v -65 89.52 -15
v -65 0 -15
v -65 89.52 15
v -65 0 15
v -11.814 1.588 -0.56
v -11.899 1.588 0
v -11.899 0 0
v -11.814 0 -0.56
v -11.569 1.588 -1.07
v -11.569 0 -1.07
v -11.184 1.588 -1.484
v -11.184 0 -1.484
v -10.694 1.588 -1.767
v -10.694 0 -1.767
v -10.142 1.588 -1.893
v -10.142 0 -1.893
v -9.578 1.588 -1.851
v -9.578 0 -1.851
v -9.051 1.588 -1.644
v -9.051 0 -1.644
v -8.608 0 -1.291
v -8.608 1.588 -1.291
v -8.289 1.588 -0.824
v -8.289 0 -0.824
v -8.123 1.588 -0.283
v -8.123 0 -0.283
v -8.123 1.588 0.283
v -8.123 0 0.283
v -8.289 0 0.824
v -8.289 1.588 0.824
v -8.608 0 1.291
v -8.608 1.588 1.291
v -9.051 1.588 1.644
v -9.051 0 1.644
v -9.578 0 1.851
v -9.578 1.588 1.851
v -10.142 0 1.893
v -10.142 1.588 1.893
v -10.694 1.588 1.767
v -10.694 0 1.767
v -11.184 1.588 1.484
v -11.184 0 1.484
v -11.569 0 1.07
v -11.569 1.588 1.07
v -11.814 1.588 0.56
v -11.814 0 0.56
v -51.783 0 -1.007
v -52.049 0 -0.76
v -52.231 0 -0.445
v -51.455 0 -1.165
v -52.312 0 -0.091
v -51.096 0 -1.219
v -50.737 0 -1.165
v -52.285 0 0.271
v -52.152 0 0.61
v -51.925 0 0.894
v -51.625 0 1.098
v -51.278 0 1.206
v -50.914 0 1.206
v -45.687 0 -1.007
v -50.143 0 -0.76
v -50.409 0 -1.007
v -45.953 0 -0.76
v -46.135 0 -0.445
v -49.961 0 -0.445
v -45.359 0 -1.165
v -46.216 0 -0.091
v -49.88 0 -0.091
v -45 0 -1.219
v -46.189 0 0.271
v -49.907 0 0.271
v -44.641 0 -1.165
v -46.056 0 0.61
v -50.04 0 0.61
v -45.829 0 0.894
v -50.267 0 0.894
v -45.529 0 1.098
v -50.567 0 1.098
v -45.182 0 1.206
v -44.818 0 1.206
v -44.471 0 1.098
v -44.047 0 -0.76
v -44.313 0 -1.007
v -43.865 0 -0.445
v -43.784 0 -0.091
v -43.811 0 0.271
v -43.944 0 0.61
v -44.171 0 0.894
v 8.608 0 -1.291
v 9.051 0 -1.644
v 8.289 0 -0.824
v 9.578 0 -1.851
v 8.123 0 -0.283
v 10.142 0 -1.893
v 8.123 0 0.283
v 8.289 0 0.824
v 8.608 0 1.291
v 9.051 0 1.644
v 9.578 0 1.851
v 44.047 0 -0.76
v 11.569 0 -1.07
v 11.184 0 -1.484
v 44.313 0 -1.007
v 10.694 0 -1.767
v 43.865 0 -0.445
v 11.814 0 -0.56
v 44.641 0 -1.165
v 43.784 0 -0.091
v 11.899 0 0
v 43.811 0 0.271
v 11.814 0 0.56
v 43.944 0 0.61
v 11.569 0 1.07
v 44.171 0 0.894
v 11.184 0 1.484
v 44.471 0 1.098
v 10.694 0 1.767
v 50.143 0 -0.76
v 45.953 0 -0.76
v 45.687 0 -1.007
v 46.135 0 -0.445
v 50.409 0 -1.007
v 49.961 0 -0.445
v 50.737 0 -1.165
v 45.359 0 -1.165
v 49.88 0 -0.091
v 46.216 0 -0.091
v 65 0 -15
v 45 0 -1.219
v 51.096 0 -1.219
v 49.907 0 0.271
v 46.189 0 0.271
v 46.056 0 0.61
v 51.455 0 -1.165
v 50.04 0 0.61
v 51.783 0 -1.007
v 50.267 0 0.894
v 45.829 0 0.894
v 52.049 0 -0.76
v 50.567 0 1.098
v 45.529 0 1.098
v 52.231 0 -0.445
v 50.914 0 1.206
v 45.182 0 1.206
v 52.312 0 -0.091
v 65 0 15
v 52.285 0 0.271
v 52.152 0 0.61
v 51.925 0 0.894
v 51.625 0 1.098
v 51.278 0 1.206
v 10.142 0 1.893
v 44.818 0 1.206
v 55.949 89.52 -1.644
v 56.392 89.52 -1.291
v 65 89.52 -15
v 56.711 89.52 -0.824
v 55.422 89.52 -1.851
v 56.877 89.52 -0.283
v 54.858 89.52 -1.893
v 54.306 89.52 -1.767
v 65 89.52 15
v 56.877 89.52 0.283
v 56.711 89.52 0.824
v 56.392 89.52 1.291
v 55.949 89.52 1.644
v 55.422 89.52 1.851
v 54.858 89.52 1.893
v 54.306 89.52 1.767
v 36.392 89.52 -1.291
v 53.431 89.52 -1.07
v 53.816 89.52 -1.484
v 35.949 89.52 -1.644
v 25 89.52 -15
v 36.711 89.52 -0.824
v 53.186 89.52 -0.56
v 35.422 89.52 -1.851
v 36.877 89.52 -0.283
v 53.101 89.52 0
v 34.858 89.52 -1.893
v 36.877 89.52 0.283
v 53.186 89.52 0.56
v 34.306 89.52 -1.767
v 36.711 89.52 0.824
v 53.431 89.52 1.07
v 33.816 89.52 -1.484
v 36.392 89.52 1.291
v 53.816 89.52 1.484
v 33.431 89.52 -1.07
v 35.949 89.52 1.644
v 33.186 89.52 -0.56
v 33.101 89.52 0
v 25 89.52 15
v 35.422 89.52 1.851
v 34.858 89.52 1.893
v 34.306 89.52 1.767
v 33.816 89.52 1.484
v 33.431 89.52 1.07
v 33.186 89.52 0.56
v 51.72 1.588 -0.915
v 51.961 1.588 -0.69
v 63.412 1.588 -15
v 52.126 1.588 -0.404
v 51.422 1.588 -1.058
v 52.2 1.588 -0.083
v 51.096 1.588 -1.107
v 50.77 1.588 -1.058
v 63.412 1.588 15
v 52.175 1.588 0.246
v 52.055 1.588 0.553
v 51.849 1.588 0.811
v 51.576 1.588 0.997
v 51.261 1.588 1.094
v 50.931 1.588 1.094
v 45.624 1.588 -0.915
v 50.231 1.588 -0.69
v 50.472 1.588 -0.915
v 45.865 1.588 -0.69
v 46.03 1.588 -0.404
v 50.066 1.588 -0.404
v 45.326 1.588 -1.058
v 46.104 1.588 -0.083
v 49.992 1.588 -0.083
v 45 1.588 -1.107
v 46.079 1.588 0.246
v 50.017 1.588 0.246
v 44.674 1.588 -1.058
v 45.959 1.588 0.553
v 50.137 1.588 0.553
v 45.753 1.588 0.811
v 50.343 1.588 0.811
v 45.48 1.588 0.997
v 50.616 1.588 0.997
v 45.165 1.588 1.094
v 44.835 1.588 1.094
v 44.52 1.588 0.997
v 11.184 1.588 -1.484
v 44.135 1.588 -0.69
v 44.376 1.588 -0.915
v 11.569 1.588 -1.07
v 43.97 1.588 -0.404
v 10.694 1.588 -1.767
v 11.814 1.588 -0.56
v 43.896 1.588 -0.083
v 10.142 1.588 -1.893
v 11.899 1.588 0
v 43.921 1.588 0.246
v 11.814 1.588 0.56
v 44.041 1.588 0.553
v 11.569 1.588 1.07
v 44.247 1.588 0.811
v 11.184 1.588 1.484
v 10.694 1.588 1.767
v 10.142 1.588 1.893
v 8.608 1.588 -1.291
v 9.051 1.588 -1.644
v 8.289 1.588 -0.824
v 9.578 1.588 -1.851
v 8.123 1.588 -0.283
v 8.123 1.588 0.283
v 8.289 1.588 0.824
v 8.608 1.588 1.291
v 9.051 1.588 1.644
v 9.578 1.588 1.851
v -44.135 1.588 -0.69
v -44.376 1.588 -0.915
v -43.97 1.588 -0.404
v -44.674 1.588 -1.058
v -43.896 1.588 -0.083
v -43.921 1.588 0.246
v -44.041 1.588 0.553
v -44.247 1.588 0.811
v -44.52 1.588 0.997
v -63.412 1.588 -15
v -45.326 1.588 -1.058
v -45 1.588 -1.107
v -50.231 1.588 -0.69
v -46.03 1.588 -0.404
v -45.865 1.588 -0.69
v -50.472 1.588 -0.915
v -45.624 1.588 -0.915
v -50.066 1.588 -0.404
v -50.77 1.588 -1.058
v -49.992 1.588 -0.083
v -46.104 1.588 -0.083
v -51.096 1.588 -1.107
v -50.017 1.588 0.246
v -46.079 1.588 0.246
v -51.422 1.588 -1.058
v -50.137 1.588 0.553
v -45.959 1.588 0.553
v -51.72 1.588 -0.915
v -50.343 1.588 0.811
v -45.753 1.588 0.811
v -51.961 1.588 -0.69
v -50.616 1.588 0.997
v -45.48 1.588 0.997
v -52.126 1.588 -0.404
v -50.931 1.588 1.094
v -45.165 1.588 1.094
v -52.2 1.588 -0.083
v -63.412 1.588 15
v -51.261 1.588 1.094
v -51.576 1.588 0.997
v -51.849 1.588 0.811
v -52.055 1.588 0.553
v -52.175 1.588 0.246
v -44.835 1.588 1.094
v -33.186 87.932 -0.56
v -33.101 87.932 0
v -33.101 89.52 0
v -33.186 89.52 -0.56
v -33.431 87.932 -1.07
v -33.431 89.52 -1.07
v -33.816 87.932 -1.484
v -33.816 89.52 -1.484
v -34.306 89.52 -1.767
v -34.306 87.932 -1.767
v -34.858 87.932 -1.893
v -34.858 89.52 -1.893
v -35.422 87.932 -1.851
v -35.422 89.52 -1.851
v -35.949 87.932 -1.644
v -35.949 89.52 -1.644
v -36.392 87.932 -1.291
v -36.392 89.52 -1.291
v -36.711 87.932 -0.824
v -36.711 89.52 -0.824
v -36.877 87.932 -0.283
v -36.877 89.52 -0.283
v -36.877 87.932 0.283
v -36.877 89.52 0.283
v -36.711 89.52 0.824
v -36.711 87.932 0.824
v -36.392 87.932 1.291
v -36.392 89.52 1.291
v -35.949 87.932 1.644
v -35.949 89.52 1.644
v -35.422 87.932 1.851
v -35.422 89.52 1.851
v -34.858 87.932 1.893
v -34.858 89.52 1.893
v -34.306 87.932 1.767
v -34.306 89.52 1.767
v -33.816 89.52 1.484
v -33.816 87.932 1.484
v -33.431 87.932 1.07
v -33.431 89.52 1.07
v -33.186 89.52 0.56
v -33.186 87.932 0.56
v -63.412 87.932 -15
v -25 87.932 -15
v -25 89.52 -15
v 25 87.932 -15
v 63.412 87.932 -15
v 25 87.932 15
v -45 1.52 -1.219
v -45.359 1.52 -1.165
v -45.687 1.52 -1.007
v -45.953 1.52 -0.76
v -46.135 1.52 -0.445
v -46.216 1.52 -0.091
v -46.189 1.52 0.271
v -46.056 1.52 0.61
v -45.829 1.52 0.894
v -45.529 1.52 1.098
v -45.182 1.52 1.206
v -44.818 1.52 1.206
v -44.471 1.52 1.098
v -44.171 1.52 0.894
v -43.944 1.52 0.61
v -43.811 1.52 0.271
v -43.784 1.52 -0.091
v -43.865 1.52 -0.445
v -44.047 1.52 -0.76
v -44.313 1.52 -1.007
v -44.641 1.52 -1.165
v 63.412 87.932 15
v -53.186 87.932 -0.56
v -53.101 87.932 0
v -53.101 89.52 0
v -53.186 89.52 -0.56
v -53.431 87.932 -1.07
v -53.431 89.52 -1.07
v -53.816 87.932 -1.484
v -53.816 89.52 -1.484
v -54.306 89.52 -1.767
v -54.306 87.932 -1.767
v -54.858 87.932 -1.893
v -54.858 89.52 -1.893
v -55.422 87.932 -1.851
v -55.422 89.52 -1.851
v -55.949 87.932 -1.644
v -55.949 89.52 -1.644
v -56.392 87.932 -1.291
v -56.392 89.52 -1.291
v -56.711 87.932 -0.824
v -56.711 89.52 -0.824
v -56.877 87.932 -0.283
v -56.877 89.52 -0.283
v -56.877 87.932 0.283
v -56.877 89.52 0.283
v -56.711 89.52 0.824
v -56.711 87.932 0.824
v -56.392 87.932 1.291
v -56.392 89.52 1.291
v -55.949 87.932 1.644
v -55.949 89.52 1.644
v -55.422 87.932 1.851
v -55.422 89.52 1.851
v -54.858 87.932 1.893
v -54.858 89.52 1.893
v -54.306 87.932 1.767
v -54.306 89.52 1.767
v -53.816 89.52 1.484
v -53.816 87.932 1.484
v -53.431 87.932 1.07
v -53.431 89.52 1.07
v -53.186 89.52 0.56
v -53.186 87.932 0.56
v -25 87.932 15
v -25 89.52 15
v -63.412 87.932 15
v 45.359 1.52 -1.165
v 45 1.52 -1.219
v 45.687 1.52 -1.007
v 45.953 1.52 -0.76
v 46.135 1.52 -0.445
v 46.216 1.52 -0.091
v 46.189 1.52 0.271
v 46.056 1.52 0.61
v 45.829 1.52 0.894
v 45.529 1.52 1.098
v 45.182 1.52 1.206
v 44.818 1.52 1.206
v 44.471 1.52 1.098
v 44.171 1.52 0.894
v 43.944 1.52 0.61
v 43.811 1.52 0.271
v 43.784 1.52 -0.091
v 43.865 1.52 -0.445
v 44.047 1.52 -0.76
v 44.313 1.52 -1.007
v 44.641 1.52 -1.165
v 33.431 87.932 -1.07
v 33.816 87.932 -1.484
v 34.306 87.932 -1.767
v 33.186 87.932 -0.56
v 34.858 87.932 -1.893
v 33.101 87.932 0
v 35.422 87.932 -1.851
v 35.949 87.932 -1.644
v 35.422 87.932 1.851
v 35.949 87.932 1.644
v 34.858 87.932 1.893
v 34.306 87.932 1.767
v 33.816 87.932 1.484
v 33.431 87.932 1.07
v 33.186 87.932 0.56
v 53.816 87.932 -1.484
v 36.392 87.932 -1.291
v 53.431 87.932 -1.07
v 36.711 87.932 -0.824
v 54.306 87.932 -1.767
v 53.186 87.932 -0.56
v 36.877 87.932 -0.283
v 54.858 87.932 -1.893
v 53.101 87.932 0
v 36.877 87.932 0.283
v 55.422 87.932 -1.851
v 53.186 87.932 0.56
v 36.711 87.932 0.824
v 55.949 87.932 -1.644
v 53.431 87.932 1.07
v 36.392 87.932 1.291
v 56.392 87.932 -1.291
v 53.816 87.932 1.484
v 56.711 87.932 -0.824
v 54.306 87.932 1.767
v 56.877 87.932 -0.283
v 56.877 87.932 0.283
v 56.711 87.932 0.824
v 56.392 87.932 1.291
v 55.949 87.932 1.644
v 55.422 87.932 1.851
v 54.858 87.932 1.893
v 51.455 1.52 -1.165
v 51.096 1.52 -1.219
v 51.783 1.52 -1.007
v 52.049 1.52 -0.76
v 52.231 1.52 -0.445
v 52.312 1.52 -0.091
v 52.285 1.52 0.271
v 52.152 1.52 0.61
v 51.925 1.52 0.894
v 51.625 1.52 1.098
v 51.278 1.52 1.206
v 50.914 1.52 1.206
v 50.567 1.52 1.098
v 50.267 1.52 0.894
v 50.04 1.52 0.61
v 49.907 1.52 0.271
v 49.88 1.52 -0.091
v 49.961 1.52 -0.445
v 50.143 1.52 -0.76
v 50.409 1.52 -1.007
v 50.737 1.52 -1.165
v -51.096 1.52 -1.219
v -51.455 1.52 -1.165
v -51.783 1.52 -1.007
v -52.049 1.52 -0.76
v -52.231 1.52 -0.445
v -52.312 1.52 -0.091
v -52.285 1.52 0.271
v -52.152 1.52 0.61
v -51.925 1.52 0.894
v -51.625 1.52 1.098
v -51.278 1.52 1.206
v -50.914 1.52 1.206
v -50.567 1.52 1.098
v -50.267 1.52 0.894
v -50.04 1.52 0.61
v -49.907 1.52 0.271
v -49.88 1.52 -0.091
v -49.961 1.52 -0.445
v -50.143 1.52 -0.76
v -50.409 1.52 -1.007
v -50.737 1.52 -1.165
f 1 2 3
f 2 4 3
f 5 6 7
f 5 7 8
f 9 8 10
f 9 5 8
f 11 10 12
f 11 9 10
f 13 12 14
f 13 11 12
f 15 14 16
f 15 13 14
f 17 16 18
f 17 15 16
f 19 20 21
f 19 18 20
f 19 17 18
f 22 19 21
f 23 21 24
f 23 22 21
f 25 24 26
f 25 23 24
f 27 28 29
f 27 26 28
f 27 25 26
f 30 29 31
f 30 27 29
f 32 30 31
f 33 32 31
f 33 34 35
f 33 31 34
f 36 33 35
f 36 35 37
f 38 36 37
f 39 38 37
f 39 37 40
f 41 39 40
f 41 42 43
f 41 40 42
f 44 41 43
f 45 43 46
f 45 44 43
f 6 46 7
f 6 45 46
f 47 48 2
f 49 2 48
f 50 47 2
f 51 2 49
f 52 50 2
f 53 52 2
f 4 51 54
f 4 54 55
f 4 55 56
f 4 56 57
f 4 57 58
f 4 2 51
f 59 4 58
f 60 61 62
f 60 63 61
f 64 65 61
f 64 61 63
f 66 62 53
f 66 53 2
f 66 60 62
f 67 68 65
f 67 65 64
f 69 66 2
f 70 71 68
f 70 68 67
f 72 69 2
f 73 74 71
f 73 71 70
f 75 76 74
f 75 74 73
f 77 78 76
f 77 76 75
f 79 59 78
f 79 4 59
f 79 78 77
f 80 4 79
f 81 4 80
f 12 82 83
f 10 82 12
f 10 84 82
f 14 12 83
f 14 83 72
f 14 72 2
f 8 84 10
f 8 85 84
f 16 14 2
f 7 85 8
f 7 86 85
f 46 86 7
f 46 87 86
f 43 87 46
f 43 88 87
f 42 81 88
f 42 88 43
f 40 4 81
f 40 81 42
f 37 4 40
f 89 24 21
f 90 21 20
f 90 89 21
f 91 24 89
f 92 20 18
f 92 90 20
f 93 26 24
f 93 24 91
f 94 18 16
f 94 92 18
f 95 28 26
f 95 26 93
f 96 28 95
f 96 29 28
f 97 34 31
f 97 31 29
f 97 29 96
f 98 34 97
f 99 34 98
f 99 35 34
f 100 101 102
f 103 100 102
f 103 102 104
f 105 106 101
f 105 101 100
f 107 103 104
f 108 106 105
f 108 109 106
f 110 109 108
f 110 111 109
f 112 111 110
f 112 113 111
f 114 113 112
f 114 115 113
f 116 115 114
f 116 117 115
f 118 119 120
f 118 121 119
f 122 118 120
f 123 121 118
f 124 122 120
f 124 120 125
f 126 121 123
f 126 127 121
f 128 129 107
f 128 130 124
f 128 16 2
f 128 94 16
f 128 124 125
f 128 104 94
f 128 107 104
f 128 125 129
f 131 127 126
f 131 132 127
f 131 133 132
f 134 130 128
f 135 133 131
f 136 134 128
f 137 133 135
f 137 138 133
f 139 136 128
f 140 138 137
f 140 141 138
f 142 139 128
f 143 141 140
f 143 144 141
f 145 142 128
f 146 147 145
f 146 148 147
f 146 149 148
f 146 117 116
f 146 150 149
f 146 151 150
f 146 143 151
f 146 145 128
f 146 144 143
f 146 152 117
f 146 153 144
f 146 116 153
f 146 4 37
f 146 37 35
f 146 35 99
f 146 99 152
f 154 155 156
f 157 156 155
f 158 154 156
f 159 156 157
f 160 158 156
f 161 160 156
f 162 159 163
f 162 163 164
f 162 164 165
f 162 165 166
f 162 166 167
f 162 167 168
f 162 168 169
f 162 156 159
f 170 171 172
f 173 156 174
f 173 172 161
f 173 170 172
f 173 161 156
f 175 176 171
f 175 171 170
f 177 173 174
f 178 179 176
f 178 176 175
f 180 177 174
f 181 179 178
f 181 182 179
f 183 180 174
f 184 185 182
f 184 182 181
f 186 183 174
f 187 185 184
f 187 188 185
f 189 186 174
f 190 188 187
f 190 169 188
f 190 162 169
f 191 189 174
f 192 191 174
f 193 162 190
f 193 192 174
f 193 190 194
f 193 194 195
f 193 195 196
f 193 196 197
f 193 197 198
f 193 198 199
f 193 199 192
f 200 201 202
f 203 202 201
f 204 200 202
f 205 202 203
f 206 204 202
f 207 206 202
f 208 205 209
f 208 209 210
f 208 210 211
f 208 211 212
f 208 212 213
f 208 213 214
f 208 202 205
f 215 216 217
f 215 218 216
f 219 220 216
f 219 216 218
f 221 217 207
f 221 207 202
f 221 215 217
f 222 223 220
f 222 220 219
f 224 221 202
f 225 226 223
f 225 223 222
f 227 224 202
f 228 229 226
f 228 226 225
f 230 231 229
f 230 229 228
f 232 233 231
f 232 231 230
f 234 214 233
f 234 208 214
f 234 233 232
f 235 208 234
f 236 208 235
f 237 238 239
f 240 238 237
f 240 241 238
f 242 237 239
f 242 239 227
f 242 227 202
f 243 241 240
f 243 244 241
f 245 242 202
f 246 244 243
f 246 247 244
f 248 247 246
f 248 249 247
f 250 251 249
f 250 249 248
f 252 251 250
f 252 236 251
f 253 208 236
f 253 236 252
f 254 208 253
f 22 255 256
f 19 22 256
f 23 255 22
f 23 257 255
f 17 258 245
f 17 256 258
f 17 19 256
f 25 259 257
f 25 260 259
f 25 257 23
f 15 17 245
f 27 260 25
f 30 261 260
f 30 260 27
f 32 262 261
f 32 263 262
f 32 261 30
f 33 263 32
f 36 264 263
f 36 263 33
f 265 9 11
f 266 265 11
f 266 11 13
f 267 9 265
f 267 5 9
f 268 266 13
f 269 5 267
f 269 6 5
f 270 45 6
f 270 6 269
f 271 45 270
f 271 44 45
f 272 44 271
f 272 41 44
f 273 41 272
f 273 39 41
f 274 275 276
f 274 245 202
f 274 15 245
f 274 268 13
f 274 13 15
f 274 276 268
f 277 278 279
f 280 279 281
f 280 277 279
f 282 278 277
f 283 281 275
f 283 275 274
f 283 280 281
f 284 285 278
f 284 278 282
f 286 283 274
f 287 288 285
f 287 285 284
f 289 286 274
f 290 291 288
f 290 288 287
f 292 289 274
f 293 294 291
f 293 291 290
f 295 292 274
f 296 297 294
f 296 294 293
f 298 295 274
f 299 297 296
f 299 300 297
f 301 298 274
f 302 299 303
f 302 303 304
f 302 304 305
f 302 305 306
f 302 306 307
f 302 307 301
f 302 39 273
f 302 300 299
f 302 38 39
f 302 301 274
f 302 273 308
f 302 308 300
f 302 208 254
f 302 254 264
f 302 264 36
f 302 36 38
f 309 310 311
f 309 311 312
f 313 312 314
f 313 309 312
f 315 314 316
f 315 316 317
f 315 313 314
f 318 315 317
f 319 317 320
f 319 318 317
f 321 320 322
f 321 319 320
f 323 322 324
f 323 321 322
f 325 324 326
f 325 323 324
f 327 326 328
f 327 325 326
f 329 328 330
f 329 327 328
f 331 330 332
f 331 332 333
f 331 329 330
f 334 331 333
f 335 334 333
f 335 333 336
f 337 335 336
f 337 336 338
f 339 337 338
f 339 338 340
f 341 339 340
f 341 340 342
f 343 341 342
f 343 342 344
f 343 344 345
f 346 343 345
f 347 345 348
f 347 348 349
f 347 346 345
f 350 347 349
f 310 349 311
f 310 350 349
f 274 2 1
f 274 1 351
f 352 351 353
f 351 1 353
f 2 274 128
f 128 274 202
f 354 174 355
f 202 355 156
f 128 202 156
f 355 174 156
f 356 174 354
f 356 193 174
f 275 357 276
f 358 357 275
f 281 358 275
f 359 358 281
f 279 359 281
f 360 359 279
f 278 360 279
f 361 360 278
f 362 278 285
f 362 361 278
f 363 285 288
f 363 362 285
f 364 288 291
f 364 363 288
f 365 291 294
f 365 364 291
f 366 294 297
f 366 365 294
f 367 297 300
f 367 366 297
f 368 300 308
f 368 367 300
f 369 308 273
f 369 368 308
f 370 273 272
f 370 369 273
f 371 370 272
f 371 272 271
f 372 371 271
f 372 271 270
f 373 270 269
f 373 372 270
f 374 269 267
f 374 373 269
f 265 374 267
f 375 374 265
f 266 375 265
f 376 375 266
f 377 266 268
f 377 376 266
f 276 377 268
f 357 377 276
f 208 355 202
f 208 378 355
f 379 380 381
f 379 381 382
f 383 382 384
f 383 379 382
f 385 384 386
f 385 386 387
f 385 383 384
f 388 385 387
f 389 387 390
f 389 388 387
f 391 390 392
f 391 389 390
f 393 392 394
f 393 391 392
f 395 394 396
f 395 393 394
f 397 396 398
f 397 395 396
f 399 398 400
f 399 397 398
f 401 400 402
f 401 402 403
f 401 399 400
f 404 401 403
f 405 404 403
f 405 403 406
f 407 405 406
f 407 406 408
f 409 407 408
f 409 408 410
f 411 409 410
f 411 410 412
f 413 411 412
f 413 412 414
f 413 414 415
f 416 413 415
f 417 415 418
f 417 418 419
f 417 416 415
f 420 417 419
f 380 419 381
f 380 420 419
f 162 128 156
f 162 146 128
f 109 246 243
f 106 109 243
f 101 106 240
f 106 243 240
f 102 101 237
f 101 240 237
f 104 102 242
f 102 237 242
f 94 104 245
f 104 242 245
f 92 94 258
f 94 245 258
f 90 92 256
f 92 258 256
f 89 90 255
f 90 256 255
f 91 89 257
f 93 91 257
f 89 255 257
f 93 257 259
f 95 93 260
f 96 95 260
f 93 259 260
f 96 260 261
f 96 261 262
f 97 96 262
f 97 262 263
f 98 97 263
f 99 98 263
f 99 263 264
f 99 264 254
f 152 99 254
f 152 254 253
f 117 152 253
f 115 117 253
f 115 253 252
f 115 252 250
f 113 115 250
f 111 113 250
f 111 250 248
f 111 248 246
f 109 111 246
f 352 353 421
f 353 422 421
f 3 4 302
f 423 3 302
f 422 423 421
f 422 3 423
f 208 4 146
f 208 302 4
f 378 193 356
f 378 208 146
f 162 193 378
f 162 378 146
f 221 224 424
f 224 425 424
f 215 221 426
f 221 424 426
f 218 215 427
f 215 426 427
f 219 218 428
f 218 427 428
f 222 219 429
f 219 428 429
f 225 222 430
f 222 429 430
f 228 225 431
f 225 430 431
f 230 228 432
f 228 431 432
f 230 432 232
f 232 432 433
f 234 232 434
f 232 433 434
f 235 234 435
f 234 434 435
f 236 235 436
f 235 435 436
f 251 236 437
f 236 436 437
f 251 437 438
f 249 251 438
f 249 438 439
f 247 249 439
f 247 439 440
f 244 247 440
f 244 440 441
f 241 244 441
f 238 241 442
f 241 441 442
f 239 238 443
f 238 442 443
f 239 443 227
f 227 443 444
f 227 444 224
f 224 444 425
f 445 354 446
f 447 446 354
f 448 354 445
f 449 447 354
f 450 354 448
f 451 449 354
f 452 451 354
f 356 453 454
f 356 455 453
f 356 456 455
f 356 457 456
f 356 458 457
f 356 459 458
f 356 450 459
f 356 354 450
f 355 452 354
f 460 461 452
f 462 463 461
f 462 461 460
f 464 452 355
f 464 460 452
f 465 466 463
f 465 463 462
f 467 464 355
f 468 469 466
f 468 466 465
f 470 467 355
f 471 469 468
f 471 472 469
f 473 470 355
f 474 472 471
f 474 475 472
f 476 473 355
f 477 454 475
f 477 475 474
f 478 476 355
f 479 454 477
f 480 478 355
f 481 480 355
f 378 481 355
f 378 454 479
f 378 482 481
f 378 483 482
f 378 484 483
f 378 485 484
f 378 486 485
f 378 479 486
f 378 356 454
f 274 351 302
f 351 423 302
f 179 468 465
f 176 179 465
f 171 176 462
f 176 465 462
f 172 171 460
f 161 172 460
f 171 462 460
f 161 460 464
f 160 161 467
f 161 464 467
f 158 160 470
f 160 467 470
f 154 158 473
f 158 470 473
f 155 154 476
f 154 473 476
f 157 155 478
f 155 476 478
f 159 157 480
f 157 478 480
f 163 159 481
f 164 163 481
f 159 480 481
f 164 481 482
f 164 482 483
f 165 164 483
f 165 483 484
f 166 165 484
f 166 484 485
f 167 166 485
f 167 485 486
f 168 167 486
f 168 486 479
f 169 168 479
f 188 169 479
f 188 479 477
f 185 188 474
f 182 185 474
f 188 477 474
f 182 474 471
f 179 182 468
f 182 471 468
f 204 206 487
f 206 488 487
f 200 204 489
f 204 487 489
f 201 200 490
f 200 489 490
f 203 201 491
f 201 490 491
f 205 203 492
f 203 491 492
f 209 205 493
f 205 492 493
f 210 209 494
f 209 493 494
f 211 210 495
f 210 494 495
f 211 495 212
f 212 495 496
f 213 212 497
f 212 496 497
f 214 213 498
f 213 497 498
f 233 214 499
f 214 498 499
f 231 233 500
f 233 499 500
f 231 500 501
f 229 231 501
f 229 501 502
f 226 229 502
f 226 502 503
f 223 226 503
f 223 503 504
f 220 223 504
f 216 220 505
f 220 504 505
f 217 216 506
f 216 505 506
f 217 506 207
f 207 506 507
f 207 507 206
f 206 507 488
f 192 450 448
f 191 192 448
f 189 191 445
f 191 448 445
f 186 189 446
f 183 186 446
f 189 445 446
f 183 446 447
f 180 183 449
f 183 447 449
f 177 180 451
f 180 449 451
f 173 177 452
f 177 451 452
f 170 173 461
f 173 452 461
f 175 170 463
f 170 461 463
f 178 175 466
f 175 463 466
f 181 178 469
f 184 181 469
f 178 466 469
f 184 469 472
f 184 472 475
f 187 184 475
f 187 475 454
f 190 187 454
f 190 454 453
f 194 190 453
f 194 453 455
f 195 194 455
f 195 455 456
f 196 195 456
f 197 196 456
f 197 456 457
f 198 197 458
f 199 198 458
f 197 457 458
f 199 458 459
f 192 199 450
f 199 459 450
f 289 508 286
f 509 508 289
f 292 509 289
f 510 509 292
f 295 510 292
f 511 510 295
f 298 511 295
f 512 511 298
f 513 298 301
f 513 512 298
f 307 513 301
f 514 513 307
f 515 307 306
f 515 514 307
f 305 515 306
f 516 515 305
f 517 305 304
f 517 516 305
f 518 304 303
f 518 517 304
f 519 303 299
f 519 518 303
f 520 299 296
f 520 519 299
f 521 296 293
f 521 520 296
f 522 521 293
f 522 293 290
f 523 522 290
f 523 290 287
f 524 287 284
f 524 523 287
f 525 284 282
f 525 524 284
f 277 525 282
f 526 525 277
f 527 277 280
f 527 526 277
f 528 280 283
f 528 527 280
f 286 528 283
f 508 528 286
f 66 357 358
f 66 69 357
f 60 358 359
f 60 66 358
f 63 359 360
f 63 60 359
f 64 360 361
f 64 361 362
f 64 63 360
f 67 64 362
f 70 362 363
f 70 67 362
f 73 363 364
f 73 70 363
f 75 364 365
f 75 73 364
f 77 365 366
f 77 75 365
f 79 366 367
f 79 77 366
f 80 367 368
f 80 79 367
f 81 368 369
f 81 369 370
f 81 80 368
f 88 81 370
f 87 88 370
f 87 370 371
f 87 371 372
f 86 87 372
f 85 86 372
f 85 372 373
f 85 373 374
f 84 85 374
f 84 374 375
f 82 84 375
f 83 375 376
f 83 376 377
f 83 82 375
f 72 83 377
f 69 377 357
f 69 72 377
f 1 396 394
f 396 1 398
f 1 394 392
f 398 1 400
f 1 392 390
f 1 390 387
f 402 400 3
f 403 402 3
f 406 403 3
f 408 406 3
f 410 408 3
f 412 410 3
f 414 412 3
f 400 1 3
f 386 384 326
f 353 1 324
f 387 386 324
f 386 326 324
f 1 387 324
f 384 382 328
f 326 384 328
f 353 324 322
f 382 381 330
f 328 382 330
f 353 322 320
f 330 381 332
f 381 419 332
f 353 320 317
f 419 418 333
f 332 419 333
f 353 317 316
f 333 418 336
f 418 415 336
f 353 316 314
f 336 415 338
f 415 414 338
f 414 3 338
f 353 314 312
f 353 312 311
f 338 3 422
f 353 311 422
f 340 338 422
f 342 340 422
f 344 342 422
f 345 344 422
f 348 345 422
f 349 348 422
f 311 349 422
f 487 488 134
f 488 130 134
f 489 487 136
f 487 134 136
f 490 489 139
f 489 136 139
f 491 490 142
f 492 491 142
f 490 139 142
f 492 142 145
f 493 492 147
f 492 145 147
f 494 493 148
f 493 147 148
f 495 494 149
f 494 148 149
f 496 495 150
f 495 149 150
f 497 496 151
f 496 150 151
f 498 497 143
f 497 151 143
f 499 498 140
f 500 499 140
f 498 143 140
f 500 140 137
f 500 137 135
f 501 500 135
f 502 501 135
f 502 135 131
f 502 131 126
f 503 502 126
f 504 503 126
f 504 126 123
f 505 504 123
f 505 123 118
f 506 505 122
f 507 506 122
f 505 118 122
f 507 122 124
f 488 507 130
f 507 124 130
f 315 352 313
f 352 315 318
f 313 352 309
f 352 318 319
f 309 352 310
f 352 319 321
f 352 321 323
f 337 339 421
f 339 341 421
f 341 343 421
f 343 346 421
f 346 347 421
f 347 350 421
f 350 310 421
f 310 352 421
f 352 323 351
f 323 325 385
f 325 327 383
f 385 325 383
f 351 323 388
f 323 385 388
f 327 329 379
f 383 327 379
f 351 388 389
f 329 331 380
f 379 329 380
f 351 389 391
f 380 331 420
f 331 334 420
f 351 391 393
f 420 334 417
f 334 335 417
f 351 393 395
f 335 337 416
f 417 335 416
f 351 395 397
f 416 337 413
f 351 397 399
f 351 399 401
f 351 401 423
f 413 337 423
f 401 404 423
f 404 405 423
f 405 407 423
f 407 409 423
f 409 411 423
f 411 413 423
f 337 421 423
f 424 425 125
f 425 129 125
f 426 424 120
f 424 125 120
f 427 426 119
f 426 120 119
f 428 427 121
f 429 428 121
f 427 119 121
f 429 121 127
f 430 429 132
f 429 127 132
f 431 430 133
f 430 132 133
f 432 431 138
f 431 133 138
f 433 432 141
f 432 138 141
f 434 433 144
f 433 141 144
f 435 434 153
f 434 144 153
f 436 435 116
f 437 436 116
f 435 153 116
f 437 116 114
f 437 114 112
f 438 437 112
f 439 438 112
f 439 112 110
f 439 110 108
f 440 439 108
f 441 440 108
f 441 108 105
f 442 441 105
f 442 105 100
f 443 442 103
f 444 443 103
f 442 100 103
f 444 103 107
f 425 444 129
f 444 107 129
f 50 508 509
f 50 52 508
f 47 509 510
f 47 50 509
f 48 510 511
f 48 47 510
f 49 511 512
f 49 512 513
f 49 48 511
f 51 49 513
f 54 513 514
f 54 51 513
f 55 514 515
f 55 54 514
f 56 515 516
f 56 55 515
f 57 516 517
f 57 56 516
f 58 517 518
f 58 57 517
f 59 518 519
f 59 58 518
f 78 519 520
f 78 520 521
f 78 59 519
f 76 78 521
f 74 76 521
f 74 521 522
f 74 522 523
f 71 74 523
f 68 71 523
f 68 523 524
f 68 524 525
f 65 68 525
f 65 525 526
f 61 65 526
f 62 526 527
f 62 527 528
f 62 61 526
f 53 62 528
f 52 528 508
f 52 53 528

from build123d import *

# Parameters (mm, degrees)
BOSS_EXTRUDE1_DEPTH            = 15
F_2_CLEARANCE_HOLE1_AT_2_COUNT = 2
F_2_CLEARANCE_HOLE1_AT_2_PITCH = 6.096
F_6_START                      = 87.9325
F_6_CLEARANCE_HOLE1_OUTLINE_R  = 1.89865
F_6_CLEARANCE_HOLE1_DEPTH      = 1.5875
F_6_CLEARANCE_HOLE2_D          = 3.7973


# Read off the part's stored shape, not the designer's step: #6 Clearance Hole1
with BuildPart() as part:
    # Sketch1 → Boss-Extrude1 (new, symmetric)
    with BuildSketch(Plane.XY):
        Polygon((0, 0), (-65, 0), (-65, 89.52), (-25, 89.52), (-25, 87.9325), (-63.4125, 87.9325), (-63.4125, 1.5875), (0, 1.5875), align=None)
    boss_extrude1 = extrude(amount=BOSS_EXTRUDE1_DEPTH, both=True)

    # Sketch2 → #2 Clearance Hole1 (revolve, cut)
    with BuildSketch(Plane(origin=(-51.096, 0, 0), x_dir=(0, 0, -1), z_dir=(1, 0, 0))):
        Polygon((0, 0), (0, 2.252569267), (1.2192, 1.52), (1.2192, 0), align=None)
    f_2_clearance_hole1 = revolve(axis=Axis((-51.096, -6.35, 0), (0, 1, 0)), mode=Mode.SUBTRACT)

    # #2 Clearance Hole1 at 2: #2 Clearance Hole1 ×2
    with Locations(*[(i * F_2_CLEARANCE_HOLE1_AT_2_PITCH, 0, 0) for i in range(1, F_2_CLEARANCE_HOLE1_AT_2_COUNT)]):
        add(f_2_clearance_hole1, mode=Mode.SUBTRACT)

    # #6 Clearance Hole1 outline → #6 Clearance Hole1 (cut)
    with BuildSketch(Plane(origin=(0, 0, 0), x_dir=(1, 0, 0), z_dir=(0, 1, 0)).offset(F_6_START)):
        with Locations((-55, 0)):
            Circle(F_6_CLEARANCE_HOLE1_OUTLINE_R)
        with Locations((-35, 0)):
            Circle(F_6_CLEARANCE_HOLE1_OUTLINE_R)
    f_6_clearance_hole1 = extrude(amount=F_6_CLEARANCE_HOLE1_DEPTH, mode=Mode.SUBTRACT)

    # Mirror2: Boss-Extrude1, #2 Clearance Hole1, #6 Clearance Hole1 across plane
    add(boss_extrude1.mirror(Plane(origin=(0, 1.5875, -15), x_dir=(0, 0, 1), z_dir=(1, 0, 0))))
    add(f_2_clearance_hole1.mirror(Plane(origin=(0, 1.5875, -15), x_dir=(0, 0, 1), z_dir=(1, 0, 0))), mode=Mode.SUBTRACT)
    add(f_6_clearance_hole1.mirror(Plane(origin=(0, 1.5875, -15), x_dir=(0, 0, 1), z_dir=(1, 0, 0))), mode=Mode.SUBTRACT)

    # Mirror2 copy 1 sketch → Mirror2 copy 1 (revolve, cut)
    with BuildSketch(Plane(origin=(45, 0, 0), x_dir=(0, 0, -1), z_dir=(-1, 0, 0))):
        Polygon((0, 0), (0, -2.252569267), (1.2192, -1.52), (1.2192, 0), align=None)
    revolve(axis=Axis((45, -6.35, 0), (0, -1, 0)), mode=Mode.SUBTRACT)

    # #6 Clearance Hole2 (through all)
    with Locations(Plane(origin=(0, 0, 0), x_dir=(-1, 0, 0), z_dir=(0, -1, 0))):
        with Locations((-10, 0)):
            f_6_clearance_hole2 = Hole(F_6_CLEARANCE_HOLE2_D / 2)

    # Mirror3: #6 Clearance Hole2 across plane
    add(f_6_clearance_hole2.mirror(Plane(origin=(0, 0, 0), x_dir=(0, 0, 1), z_dir=(1, 0, 0))), mode=Mode.SUBTRACT)


solid = part.part
